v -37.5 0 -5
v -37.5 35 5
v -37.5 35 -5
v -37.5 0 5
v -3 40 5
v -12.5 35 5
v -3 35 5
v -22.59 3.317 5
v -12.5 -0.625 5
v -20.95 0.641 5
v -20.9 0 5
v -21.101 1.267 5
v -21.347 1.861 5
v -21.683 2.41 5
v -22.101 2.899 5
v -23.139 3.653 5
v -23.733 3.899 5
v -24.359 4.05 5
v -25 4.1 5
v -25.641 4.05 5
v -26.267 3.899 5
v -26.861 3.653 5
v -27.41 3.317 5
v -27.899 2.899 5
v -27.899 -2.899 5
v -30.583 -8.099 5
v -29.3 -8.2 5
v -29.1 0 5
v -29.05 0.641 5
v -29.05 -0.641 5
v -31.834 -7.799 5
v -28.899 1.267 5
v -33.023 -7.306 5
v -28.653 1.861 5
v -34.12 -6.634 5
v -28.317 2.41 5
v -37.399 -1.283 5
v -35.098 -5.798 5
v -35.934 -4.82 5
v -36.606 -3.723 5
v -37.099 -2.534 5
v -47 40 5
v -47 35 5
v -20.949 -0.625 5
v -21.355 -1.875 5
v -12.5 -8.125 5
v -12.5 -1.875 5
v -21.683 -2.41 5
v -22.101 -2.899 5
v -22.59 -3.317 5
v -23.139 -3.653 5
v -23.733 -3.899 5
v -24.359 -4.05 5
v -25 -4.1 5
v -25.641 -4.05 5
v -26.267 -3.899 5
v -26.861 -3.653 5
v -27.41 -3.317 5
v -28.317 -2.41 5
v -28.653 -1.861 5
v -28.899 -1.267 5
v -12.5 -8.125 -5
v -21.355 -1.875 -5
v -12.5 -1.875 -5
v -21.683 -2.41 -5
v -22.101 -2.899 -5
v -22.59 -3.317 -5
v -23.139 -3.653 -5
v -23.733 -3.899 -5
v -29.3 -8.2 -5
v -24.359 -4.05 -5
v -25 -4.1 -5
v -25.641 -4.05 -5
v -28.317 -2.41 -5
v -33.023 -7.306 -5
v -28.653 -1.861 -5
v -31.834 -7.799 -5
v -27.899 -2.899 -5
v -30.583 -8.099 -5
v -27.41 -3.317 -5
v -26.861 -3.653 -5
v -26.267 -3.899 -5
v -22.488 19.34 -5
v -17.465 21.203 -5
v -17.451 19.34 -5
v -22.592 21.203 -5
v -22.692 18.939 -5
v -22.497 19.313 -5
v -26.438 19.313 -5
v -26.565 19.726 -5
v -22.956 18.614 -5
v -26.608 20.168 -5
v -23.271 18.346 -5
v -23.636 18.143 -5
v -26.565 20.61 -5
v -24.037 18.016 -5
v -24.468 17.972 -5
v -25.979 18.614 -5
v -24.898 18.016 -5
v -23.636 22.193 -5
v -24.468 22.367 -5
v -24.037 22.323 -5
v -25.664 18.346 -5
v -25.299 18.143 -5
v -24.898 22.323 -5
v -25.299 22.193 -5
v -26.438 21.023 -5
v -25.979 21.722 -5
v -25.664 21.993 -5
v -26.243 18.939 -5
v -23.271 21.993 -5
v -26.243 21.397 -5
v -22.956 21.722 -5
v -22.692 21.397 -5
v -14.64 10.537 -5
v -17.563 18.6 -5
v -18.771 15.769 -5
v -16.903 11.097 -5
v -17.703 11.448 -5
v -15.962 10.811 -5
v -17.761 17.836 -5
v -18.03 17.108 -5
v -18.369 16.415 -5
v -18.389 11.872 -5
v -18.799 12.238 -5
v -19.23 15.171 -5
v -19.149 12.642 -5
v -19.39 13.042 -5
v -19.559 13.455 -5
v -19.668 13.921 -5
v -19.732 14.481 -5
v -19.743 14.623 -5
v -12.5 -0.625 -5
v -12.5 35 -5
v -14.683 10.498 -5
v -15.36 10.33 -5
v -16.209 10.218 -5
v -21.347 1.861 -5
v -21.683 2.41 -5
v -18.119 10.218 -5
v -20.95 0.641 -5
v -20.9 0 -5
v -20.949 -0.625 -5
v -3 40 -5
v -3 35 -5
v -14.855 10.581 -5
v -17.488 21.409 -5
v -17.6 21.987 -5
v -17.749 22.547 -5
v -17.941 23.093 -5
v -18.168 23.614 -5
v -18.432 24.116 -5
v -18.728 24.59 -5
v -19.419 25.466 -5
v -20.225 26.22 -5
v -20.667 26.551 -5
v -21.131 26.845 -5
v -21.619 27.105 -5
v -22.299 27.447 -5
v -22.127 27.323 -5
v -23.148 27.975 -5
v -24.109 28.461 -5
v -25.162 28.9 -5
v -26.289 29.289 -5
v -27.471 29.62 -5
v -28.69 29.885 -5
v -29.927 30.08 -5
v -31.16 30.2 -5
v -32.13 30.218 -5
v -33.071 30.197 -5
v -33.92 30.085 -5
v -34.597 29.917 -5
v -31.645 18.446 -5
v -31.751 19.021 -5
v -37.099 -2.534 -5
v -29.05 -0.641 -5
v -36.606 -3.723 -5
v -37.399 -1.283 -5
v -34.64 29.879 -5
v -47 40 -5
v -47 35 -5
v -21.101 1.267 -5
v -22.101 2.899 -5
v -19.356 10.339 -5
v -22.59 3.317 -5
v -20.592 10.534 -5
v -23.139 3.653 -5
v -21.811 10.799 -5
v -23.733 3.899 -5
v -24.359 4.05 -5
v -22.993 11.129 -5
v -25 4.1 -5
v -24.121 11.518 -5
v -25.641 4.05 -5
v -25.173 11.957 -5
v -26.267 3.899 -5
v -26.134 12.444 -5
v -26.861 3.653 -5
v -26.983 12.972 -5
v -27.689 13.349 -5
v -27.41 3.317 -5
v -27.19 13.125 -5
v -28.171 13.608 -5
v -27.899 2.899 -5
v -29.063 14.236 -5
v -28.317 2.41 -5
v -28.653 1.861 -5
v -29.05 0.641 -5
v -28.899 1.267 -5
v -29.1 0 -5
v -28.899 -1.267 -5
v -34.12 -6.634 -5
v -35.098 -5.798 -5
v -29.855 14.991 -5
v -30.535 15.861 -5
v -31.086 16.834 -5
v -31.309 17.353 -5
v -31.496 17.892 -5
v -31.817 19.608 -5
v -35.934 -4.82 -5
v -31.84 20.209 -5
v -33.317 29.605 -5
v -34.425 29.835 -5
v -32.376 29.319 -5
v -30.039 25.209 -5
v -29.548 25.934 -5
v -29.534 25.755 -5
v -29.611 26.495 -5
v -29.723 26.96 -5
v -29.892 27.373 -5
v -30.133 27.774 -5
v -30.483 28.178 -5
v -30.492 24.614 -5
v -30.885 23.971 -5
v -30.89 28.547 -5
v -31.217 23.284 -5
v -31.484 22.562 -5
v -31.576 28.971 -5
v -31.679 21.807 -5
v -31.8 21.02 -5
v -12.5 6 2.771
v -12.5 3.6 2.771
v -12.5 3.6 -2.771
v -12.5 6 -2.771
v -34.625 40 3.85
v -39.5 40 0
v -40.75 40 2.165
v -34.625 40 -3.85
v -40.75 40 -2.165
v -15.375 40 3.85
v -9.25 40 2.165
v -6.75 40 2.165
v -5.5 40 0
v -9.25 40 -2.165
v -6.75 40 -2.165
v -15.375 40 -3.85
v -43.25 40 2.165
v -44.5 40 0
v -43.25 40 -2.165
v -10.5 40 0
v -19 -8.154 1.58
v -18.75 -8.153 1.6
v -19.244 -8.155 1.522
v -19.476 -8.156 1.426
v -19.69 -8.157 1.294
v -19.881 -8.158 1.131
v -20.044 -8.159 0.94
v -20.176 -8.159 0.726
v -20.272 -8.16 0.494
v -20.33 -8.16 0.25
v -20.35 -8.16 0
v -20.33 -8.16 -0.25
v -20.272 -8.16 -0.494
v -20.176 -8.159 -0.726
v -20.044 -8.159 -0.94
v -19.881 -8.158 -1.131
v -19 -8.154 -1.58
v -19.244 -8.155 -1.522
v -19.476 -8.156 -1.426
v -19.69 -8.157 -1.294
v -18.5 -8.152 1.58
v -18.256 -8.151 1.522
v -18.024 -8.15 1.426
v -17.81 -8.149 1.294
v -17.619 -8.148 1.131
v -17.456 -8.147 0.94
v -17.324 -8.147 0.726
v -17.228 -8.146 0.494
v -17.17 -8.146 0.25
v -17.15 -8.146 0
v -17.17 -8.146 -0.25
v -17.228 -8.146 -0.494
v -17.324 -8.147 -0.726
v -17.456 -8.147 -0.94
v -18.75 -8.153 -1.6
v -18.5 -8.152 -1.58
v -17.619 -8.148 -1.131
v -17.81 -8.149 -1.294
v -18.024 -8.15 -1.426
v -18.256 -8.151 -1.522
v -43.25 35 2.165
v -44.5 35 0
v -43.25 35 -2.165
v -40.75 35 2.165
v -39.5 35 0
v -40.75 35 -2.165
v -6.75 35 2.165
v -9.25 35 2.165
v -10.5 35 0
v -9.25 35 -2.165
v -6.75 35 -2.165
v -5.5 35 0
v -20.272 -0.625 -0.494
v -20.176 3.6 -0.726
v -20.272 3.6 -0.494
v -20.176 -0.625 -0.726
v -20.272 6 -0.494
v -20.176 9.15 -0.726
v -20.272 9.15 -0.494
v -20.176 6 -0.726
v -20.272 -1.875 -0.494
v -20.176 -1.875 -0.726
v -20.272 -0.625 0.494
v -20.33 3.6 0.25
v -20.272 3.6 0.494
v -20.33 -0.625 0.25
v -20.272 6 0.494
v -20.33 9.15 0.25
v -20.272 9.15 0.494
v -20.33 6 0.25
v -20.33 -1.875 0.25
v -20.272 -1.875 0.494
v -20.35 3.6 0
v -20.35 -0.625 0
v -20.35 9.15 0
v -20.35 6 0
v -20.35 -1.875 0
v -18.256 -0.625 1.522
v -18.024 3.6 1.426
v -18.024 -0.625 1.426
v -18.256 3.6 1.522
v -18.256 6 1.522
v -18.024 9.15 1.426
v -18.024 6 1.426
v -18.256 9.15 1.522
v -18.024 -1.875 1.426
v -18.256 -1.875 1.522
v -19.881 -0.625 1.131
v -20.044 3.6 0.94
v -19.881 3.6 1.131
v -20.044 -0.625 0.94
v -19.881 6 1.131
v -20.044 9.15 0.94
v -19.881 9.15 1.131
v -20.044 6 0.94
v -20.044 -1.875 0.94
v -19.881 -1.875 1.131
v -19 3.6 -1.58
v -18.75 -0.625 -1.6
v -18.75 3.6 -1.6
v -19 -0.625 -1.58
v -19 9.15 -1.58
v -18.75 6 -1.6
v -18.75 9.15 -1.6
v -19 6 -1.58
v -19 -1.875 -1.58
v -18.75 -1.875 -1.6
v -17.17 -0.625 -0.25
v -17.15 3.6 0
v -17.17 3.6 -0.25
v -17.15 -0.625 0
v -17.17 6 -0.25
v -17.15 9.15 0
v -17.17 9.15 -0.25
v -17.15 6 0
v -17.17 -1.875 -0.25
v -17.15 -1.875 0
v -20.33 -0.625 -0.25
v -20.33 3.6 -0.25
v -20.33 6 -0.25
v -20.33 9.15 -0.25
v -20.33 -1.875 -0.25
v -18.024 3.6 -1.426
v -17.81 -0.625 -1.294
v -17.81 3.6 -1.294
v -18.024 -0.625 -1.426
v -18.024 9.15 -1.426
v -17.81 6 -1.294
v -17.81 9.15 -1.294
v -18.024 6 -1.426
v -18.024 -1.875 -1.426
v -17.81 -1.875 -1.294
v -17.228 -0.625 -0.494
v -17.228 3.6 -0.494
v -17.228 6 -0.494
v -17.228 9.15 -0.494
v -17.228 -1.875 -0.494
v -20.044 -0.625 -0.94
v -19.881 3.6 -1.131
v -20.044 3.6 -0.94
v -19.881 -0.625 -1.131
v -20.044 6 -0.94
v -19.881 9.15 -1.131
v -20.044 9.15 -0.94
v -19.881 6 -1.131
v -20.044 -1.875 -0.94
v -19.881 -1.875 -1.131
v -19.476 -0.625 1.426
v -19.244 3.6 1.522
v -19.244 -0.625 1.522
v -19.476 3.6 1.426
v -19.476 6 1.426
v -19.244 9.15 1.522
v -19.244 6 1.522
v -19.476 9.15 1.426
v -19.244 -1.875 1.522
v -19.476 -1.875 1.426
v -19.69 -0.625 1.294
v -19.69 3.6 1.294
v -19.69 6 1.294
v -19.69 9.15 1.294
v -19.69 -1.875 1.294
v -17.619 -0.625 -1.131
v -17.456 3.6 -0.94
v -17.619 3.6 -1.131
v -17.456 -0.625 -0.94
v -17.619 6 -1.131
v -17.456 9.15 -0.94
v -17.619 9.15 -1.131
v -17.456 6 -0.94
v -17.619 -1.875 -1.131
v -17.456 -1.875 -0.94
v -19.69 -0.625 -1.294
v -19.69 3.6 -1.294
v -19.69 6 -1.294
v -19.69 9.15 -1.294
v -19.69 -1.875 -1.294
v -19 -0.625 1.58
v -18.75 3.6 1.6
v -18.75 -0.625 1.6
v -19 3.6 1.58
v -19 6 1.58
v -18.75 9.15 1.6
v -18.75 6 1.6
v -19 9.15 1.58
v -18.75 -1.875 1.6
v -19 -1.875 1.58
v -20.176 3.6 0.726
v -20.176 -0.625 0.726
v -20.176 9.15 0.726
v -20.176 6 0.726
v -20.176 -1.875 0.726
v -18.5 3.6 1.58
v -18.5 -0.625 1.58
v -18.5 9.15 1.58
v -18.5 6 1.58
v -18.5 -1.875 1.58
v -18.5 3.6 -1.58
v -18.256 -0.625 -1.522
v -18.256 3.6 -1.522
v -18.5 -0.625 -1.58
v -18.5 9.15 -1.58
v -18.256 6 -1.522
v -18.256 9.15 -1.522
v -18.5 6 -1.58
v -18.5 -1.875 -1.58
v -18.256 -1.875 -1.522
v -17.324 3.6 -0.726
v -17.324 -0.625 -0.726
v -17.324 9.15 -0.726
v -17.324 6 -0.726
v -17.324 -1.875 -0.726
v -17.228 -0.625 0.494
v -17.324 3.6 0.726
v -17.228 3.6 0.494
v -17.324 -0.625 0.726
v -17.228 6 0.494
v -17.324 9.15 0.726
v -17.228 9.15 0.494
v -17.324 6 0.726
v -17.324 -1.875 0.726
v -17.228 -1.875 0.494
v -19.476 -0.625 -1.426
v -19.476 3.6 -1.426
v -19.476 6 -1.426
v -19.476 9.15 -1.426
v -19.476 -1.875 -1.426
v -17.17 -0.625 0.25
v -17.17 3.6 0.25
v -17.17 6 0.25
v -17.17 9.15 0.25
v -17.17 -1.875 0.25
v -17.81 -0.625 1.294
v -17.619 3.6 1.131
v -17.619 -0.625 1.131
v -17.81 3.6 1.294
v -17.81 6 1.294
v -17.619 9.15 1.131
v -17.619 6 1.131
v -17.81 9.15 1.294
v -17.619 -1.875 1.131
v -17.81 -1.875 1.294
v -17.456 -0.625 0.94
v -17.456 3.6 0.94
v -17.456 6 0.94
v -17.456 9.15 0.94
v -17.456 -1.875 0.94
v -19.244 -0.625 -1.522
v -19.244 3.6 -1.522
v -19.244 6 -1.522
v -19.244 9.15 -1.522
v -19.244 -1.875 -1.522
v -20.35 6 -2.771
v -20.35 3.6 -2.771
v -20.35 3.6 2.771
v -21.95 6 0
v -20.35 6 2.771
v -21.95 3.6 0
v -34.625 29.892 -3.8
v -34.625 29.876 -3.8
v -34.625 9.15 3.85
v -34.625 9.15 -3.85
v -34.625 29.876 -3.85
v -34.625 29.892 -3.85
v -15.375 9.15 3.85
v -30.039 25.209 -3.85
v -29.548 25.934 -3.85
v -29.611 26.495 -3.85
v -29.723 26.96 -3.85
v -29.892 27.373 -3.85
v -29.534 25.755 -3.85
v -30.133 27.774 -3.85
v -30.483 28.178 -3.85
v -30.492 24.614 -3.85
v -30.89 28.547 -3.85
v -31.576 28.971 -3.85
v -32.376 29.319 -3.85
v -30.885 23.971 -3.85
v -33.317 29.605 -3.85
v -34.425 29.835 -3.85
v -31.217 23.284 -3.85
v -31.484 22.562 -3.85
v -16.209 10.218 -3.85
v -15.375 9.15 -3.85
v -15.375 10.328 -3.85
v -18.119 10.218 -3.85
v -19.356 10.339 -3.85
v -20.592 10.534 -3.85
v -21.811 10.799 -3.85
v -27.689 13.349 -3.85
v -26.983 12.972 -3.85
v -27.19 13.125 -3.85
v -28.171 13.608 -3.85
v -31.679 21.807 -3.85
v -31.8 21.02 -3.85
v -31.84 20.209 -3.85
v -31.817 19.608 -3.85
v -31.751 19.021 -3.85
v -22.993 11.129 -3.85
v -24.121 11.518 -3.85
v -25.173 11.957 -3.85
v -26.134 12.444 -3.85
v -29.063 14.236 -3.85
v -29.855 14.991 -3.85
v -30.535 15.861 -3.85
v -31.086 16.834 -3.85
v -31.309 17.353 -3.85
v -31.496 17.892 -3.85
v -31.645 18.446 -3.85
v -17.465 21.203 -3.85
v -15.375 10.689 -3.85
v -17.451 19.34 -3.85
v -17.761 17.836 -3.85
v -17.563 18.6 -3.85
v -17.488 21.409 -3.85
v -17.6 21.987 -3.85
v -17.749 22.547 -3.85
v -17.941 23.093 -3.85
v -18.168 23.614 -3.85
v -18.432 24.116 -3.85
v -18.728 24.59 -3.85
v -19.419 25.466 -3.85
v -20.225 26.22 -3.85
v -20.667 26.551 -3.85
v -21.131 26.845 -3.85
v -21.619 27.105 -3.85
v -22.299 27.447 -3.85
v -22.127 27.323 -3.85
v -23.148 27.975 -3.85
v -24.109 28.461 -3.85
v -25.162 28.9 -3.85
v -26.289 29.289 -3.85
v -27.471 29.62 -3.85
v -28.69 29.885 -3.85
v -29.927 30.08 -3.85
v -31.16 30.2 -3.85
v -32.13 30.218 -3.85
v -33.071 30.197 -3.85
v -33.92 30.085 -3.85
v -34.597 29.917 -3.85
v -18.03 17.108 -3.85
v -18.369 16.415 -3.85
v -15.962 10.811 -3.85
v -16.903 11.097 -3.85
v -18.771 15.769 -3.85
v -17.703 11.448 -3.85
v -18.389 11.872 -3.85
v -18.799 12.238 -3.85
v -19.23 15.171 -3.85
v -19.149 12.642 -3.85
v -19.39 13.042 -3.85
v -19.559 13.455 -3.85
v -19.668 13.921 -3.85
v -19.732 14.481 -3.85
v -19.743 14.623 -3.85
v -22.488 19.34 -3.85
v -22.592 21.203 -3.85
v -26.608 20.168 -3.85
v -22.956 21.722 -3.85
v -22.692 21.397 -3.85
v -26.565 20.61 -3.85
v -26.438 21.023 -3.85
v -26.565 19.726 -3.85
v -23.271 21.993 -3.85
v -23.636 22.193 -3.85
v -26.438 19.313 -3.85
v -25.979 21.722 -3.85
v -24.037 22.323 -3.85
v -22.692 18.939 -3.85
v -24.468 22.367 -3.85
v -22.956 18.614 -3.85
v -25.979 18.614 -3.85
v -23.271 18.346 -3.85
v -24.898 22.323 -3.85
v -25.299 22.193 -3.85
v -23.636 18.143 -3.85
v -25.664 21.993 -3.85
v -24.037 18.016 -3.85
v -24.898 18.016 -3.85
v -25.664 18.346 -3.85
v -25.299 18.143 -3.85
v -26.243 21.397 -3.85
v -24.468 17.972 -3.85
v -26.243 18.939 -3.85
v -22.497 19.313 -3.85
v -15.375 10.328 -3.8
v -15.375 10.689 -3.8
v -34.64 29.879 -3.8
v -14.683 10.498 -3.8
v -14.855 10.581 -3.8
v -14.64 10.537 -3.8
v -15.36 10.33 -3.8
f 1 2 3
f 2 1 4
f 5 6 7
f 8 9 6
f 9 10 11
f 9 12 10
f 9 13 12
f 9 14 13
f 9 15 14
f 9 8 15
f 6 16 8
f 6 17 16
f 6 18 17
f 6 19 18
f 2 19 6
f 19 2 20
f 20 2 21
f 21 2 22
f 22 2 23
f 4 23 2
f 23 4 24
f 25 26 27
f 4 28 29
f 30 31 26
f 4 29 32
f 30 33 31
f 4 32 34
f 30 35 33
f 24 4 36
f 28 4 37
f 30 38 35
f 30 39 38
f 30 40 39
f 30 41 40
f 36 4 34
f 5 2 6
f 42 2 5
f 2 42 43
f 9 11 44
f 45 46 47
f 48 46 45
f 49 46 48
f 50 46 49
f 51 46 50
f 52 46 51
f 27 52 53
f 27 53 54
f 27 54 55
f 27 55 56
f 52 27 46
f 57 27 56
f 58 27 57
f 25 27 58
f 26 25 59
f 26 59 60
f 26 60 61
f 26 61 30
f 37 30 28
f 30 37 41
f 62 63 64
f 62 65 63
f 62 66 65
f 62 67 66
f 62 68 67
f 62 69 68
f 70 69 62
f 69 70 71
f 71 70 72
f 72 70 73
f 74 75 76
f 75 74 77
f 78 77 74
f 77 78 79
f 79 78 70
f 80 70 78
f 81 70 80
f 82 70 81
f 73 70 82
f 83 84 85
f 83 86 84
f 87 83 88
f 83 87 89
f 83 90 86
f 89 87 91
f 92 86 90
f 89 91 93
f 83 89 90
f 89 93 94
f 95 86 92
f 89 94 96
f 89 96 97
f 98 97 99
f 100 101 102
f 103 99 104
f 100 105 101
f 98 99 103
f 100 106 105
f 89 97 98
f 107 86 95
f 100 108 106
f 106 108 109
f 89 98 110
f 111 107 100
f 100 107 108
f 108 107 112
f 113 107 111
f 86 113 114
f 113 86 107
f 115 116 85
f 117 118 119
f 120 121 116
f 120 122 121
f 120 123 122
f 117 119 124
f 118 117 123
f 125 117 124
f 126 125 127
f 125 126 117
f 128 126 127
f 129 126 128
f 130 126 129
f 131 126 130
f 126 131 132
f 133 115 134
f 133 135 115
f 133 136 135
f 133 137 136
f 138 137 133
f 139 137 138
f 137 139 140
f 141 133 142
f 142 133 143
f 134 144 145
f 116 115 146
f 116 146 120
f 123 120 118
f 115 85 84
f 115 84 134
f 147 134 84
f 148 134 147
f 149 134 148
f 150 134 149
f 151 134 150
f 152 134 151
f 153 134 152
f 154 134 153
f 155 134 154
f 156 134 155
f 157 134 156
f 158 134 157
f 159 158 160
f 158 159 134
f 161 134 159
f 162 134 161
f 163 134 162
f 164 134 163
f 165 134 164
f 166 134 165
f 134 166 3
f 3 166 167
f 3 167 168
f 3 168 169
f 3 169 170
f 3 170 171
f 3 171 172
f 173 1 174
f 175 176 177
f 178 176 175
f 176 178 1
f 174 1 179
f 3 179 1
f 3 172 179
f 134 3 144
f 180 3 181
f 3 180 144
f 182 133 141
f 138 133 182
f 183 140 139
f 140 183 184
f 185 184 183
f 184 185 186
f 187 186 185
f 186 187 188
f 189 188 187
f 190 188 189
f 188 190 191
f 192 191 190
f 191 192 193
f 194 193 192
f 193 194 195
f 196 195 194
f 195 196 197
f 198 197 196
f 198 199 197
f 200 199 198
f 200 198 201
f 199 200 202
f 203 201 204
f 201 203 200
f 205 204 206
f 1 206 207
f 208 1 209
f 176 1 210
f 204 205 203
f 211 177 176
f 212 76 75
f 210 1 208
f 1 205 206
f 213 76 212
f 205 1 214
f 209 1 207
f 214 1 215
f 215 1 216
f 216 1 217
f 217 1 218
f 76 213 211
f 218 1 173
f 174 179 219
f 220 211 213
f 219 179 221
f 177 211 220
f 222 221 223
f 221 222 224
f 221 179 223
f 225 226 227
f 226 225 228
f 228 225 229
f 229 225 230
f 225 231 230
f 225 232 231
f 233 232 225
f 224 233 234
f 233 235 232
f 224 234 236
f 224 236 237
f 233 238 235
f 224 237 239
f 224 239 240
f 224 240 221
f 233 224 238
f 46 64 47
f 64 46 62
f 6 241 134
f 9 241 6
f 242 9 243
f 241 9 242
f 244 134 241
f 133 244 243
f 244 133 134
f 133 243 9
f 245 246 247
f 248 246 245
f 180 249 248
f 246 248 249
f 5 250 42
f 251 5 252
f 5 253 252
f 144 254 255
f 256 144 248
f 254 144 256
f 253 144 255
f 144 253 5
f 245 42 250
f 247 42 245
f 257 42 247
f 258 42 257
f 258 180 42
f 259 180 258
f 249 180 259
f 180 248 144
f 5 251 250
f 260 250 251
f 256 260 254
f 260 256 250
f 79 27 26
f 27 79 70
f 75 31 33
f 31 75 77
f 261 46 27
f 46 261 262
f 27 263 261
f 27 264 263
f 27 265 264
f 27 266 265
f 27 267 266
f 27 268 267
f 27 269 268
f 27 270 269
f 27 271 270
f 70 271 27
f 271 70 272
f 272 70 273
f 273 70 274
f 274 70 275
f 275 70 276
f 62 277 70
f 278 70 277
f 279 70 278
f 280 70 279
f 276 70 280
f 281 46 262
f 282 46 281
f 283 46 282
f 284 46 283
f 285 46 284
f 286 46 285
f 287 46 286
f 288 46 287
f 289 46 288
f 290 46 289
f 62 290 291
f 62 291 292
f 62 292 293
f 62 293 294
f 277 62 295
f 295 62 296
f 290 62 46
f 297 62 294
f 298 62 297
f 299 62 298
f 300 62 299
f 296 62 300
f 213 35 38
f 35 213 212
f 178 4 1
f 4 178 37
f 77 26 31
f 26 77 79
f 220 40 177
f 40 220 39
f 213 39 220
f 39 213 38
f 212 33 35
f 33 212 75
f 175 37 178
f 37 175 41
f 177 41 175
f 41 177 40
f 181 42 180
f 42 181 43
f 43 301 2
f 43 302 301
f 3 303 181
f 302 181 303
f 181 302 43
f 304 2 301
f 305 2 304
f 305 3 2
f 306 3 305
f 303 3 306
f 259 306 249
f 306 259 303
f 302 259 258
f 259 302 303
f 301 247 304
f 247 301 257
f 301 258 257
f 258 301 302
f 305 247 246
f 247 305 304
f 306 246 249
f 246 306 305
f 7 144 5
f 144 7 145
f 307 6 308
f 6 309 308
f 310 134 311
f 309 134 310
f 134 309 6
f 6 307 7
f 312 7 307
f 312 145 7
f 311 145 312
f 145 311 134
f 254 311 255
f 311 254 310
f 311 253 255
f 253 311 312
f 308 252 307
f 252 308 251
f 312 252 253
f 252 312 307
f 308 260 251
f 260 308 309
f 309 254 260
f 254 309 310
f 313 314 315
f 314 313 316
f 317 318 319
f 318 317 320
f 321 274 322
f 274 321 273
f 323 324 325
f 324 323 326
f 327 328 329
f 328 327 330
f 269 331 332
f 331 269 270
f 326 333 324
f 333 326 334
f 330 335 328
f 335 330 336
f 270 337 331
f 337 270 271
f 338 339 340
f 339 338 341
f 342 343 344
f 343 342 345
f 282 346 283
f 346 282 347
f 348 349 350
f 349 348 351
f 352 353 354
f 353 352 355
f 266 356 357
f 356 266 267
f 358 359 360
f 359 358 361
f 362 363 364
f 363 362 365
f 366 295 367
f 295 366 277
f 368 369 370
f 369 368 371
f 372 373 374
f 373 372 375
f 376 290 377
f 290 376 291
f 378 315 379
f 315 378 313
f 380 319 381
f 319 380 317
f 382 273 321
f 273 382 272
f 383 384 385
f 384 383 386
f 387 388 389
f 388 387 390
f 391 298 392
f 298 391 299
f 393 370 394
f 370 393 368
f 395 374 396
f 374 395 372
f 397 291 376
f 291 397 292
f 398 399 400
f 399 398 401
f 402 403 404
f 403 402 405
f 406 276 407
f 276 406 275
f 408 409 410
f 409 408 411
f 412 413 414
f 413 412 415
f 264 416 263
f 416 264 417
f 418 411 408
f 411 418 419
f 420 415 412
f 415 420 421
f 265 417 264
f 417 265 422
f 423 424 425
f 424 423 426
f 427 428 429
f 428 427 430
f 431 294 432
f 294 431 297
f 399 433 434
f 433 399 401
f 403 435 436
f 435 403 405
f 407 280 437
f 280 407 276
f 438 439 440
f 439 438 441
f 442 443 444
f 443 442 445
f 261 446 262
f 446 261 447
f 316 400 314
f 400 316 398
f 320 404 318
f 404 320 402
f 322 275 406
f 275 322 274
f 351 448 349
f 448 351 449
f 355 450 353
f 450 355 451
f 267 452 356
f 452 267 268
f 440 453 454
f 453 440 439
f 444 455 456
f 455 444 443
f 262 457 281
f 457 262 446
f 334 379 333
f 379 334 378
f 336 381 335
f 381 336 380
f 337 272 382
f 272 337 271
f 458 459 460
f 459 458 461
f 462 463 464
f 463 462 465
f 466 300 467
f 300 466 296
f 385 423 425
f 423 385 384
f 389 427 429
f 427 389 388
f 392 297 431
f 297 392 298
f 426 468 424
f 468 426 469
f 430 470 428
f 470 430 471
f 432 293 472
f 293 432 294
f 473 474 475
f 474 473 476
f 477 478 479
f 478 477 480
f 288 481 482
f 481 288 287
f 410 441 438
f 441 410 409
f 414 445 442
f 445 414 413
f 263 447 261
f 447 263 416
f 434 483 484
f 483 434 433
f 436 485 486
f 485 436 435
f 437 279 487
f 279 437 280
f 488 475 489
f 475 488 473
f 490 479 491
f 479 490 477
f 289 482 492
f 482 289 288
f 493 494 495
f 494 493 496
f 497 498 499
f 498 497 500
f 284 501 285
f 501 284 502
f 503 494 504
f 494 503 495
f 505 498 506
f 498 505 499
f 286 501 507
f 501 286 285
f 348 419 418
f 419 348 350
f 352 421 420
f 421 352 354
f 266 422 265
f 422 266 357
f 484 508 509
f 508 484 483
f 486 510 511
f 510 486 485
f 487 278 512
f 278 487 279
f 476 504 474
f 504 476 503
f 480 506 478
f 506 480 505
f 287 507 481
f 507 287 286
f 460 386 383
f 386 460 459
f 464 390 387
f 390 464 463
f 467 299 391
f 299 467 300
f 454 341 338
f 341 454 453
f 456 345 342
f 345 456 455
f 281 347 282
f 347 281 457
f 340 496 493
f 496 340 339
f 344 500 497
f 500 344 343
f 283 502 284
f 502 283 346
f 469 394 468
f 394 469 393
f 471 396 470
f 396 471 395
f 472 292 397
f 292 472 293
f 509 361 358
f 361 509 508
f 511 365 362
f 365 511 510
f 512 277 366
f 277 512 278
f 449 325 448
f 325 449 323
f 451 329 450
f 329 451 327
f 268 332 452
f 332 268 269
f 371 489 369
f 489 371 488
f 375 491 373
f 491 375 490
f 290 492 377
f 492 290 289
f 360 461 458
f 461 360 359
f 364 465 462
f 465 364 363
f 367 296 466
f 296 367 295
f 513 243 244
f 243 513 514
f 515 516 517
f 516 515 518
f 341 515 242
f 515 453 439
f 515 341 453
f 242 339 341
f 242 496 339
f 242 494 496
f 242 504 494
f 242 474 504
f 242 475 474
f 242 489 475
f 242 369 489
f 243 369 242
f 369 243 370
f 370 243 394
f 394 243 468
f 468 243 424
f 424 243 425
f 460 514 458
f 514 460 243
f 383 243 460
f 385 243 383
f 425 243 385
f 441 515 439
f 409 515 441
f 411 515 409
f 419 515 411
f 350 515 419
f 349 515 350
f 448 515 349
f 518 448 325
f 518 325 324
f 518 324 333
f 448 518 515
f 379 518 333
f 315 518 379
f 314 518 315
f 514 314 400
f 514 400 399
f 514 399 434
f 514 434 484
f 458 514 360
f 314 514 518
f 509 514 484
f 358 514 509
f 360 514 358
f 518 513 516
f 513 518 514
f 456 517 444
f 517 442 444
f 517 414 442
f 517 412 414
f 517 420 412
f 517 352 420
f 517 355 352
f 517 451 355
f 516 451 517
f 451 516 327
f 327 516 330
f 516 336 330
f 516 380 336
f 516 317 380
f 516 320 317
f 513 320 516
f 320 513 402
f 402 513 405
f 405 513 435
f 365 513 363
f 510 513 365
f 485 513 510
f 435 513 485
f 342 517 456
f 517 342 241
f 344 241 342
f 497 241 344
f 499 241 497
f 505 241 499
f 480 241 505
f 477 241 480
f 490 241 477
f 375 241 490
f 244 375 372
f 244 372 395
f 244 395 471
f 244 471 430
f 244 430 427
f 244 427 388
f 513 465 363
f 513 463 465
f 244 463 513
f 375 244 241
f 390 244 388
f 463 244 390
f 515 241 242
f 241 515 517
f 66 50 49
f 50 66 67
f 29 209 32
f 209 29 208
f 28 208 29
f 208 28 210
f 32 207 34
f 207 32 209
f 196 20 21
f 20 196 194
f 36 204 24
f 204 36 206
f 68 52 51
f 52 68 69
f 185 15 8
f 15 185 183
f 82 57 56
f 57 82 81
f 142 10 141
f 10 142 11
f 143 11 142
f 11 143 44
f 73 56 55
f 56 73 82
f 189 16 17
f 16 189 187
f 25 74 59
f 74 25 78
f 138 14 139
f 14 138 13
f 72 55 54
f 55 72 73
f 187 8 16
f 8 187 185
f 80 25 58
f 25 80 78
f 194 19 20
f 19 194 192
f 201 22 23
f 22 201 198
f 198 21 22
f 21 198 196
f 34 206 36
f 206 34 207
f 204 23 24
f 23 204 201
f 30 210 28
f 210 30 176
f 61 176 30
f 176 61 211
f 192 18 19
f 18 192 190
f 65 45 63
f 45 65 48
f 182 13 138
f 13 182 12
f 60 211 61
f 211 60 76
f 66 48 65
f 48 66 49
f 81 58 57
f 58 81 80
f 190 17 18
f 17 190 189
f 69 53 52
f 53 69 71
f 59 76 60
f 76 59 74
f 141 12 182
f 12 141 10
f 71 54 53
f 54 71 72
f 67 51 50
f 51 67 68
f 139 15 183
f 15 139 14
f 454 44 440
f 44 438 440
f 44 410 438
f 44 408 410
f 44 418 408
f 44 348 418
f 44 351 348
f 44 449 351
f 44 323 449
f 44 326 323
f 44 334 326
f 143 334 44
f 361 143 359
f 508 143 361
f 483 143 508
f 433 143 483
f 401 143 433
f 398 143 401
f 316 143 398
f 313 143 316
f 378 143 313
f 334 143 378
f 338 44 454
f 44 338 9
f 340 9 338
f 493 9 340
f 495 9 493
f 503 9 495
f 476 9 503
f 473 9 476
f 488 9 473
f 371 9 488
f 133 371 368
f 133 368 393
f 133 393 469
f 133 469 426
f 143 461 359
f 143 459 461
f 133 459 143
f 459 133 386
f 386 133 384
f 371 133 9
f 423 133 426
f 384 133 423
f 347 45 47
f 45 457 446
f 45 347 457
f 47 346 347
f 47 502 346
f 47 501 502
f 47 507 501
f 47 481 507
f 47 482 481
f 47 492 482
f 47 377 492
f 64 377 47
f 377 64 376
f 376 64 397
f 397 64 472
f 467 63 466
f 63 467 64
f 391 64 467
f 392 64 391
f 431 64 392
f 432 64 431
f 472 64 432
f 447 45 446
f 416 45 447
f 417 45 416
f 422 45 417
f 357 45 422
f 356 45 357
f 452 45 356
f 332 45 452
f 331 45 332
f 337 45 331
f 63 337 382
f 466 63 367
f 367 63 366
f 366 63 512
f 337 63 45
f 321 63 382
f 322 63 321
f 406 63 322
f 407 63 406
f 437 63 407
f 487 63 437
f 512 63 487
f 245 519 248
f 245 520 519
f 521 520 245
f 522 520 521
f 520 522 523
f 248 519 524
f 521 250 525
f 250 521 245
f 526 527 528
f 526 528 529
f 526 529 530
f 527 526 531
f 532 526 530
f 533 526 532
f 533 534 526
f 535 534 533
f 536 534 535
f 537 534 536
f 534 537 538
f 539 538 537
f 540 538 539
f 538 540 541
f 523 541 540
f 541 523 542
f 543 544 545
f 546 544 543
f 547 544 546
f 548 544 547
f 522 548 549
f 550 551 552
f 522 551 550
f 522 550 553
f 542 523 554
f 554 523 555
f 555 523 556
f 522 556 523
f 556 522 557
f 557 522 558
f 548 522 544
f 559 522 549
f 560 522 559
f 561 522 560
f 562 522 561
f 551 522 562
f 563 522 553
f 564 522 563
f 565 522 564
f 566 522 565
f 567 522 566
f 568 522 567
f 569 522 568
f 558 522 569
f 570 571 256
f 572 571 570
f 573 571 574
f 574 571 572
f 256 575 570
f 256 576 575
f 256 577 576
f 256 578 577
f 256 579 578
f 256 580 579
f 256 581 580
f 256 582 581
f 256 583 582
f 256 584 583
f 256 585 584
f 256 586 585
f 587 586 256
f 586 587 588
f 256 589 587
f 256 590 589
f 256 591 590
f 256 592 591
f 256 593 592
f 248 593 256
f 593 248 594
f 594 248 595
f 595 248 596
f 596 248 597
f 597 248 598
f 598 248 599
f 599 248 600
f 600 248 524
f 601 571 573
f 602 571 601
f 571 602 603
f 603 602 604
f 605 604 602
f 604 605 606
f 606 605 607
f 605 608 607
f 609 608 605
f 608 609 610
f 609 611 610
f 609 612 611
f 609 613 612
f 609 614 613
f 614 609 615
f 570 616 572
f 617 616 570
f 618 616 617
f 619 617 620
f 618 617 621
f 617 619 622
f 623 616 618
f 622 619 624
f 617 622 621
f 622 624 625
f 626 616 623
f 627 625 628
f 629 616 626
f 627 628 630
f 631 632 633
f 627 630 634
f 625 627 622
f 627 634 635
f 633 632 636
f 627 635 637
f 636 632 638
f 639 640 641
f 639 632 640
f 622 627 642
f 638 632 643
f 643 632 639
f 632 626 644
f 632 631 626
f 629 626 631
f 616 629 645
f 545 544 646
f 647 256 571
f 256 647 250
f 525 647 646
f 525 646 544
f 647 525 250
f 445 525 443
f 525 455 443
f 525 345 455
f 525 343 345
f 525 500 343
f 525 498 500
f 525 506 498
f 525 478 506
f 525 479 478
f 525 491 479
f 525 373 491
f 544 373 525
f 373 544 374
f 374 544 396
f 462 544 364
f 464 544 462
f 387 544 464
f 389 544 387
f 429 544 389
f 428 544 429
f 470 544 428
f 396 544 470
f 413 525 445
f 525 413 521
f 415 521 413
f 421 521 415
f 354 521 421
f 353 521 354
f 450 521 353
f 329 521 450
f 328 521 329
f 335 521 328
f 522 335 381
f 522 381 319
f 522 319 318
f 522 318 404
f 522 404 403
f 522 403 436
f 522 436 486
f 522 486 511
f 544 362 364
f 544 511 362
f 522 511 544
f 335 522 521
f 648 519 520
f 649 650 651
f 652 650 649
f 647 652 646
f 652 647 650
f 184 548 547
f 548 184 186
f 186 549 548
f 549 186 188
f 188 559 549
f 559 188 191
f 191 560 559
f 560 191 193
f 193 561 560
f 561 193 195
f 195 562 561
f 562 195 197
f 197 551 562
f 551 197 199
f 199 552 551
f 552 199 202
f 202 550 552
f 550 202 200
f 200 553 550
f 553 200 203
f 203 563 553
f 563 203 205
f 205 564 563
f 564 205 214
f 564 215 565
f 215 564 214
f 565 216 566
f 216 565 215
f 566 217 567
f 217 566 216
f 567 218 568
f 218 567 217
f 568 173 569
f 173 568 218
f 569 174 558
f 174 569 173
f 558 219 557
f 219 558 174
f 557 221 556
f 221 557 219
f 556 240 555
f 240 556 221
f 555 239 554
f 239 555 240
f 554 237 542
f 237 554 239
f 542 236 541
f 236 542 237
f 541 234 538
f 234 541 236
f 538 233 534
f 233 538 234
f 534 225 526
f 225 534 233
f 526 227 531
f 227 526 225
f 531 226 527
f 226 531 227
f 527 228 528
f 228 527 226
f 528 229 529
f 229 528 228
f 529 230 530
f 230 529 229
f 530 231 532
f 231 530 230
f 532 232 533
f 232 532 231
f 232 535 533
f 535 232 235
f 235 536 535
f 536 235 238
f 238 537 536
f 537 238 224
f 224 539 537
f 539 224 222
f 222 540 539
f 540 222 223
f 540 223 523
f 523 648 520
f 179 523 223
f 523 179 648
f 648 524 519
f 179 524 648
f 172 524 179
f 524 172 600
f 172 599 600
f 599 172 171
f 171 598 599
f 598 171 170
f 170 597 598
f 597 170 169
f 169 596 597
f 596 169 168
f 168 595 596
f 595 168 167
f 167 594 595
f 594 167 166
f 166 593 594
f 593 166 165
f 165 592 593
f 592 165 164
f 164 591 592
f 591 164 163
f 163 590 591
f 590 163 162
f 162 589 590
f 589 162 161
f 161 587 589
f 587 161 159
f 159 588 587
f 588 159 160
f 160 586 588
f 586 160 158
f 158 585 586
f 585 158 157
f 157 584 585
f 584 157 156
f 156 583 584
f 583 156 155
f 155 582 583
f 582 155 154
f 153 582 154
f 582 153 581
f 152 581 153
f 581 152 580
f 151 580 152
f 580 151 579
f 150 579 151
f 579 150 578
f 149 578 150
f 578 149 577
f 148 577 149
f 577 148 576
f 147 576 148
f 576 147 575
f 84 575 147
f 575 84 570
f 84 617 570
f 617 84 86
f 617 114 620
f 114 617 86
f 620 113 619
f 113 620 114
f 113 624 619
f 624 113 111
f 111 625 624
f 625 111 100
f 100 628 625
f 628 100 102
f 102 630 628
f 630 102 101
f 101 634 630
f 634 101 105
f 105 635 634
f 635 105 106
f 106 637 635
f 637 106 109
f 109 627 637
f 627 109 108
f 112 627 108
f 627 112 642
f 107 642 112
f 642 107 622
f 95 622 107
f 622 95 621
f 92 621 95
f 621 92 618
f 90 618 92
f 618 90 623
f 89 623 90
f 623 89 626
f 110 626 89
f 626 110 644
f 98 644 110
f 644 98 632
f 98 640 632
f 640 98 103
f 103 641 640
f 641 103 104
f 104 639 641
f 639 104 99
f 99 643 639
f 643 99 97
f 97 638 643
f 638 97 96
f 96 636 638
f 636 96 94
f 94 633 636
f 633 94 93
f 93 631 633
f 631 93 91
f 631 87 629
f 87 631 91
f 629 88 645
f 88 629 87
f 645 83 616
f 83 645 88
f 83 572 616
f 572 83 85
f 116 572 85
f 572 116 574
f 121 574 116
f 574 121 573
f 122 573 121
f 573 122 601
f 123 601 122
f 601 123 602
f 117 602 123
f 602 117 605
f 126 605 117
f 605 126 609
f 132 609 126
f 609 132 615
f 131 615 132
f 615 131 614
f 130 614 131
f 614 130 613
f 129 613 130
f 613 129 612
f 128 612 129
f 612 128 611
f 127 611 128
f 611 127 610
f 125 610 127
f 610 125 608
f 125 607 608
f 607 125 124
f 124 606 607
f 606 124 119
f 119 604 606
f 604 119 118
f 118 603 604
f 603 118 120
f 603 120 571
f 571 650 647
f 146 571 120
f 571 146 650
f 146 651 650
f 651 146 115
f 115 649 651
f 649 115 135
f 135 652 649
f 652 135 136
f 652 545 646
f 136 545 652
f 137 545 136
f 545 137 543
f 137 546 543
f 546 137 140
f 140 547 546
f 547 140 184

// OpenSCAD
// file: ../libs/utils/build_plate.scad
// Minimal build plate helper for browser customizer builds.
module build_plate(build_plate_selector=0, build_plate_manual_x=100, build_plate_manual_y=100) {
  // intentionally no-op in browser preview
}
// file: ../libs/MCAD/nuts_and_bolts.scad
// License: GPL 2.0

//testNutsAndBolts();

module testNutsAndBolts()
{
	$fn = 360;
	translate([0,15])nutHole(3, proj=2);
	boltHole(3, length= 30, proj=2);
}

MM = "mm";
INCH = "inch"; //Not yet supported

//Based on: http://www.roymech.co.uk/Useful_Tables/Screws/Hex_Screws.htm
METRIC_NUT_AC_WIDTHS = 
[
	-1, //0 index is not used but reduces computation
	-1,
	-1,
	6.40,//m3
	8.10,//m4
	9.20,//m5
	11.50,//m6
	-1,
	15.00,//m8
	-1,
	19.60,//m10
	-1,
	22.10,//m12
	-1,
	-1,
	-1,
	27.70,//m16
	-1,
	-1,
	-1,
	34.60,//m20
	-1,
	-1,
	-1,
	41.60,//m24
	-1,
	-1,
	-1,
	-1,
	-1,
	53.1,//m30
	-1,
	-1,
	-1,
	-1,
	-1,
	63.5//m36
];
METRIC_NUT_THICKNESS =
[
	-1, //0 index is not used but reduces computation
	-1,
	-1,
	2.40,//m3
	3.20,//m4
	4.00,//m5
	5.00,//m6
	-1,
	6.50,//m8
	-1,
	8.00,//m10
	-1,
	10.00,//m12
	-1,
	-1,
	-1,
	13.00,//m16
	-1,
	-1,
	-1,
	16.00//m20
	-1,
	-1,
	-1,
	19.00,//m24
	-1,
	-1,
	-1,
	-1,
	-1,
	24.00,//m30
	-1,
	-1,
	-1,
	-1,
	-1,
	29.00//m36
];

COURSE_METRIC_BOLT_MAJOR_THREAD_DIAMETERS = 
[//based on max values
	-1, //0 index is not used but reduces computation
	-1,
	-1,
	2.98,//m3
	3.978,//m4
	4.976,//m5
	5.974,//m6
	-1,
	7.972,//m8
	-1,
	9.968,//m10
	-1,
	11.966,//m12
	-1,
	-1,
	-1,
	15.962,//m16
	-1,
	-1,
	-1,
	19.958,//m20
	-1,
	-1,
	-1,
	23.952,//m24
	-1,
	-1,
	-1,
	-1,
	-1,
	29.947,//m30
	-1,
	-1,
	-1,
	-1,
	-1,
	35.940//m36
];

module nutHole(size, units=MM, tolerance = +0.0001, proj = -1)
{
	//takes a metric screw/nut size and looksup nut dimensions
	radius = METRIC_NUT_AC_WIDTHS[size]/2+tolerance;
	height = METRIC_NUT_THICKNESS[size]+tolerance;
	if (proj == -1)
	{
		cylinder(r= radius, h=height, $fn = 6, center=[0,0]);
	}
	if (proj == 1)
	{
		circle(r= radius, $fn = 6);
	}
	if (proj == 2)
	{
		translate([-radius/2, 0])
			square([radius*2, height]);
	}
}

module boltHole(size, units=MM, length, tolerance = +0.0001, proj = -1)
{
	radius = COURSE_METRIC_BOLT_MAJOR_THREAD_DIAMETERS[size]/2+tolerance;
//TODO: proper screw cap values
	capHeight = METRIC_NUT_THICKNESS[size]+tolerance; //METRIC_BOLT_CAP_HEIGHTS[size]+tolerance;
	capRadius = METRIC_NUT_AC_WIDTHS[size]/2+tolerance; //METRIC_BOLT_CAP_RADIUS[size]+tolerance;
	
	if (proj == -1)
	{
	translate([0, 0, -capHeight])
		cylinder(r= capRadius, h=capHeight);
	cylinder(r = radius, h = length);
	}
	if (proj == 1)
	{
		circle(r = radius);
	}
	if (proj == 2)
	{
		translate([-capRadius/2, -capHeight])
			square([capRadius*2, capHeight]);
		square([radius*2, length]);
	}
}
boltHole(3);
// file: ../libs/build_plate.scad
//use this to include a build plate visualization in your openSCAD scripts. Very useful for things designed to be edited in Makerbot Customizer

//to use, either include or use <utils/build_plate.scad>

//then just call build_plate(); with the following arguments (also, you have to have a real object in your scene for this to render)

//putting 0 as the first argument will give you a Replicator 2 build plate
//putting 1 as the first argument will give you a Replicator 1 build plate
//putting 2 as the first argument will give you a Thingomatic build plate
//putting 3 as the first argument will give you a manually adjustable build plate (note: if you use this option, you need to specify your build plates X length (in mm) as the second argument and the Y length (in mm) as the third argument. eg. build_plate(3,150,120);)

/*

to give your user control of which build plate they see in Customizer, include the following code:

use <utils/build_plate.scad>

//for display only, doesn't contribute to final object
build_plate_selector = 0; //[0:Replicator 2,1: Replicator,2:Thingomatic,3:Manual]
//when Build Plate Selector is set to "manual" this controls the build plate x dimension
build_plate_manual_x = 100; //[100:400]
//when Build Plate Selector is set to "manual" this controls the build plate y dimension
build_plate_manual_y = 100; //[100:400]

build_plate(build_plate_selector,build_plate_manual_x,build_plate_manual_y);

*/




//to see how this works, uncomment the following code

//build_plate_selector = 0; //[0:Replicator 2,1: Replicator,2:Thingomatic,3:Manual]
//build_plate_manual_x = 100; //[100:400]
//build_plate_manual_y = 100; //[100:400]
//
//build_plate(build_plate_selector,build_plate_manual_x,build_plate_manual_y);
//
//cube(5);


module build_plate(bp,manX,manY){

		translate([0,0,-.52]){
			if(bp == 0){
				%cube([285,153,1],center = true);
			}
			if(bp == 1){
				%cube([225,145,1],center = true);
			}
			if(bp == 2){
				%cube([120,120,1],center = true);
			}
			if(bp == 3){
				%cube([manX,manY,1],center = true);
			}
		
		}
		translate([0,0,-.5]){
			if(bp == 0){
				for(i = [-14:14]){
					translate([i*10,0,0])
					%cube([.5,153,1.01],center = true);
				}
				for(i = [-7:7]){
					translate([0,i*10,0])
					%cube([285,.5,1.01],center = true);
				}	
			}
			if(bp == 1){
				for(i = [-11:11]){
					translate([i*10,0,0])
						%cube([.5,145,1.01],center = true);
				}
				for(i = [-7:7]){
					translate([0,i*10,0])
						%cube([225,.5,1.01],center = true);
				}
			}
			if(bp == 2){
				for(i = [-6:6]){
					translate([i*10,0,0])
						%cube([.5,120,1.01],center = true);
				}
				for(i = [-6:6]){
					translate([0,i*10,0])
						%cube([120,.5,1.01],center = true);
				}
			}
			if(bp == 3){
				for(i = [-(floor(manX/20)):floor(manX/20)]){
					translate([i*10,0,0])
						%cube([.5,manY,1.01],center = true);
				}
				for(i = [-(floor(manY/20)):floor(manY/20)]){
					translate([0,i*10,0])
						%cube([manX,.5,1.01],center = true);
				}
			}
		}
}
// main file
// //  Cyclone PCB Factory: a 3D printable CNC machine for PCB manufacture
// // Created by @yOPERO 
// // License: Attribution - Share Alike - Creative Commons (http://creativecommons.org/licenses/by-sa/3.0/)


use <../libs/build_plate.scad>
use <../libs/MCAD/nuts_and_bolts.scad>
fileNameLogo = "../libs/logo/cyclonelogoC.dxf";

M8_rod_diam = 8.2;
M3_rod_diam = 3.2;

smooth_rod_margin = 1;
Y_rod_height = 40;

base_screw_len = 7;
base_screw_diameter = 5;

frame_width = 25;
frame_height = Y_rod_height-smooth_rod_margin;
frame_depth = 10;

module mainBlock(){
  union(){
    //main block
    translate([0,Y_rod_height/2,0])
        cube([frame_width,Y_rod_height,frame_depth],center=true);
    //top of the block
    hull(){
      translate([frame_width/2 - M8_rod_diam,0,0])
        cylinder(r=M8_rod_diam,h=frame_depth,center = true, $fn=40);

      translate([-frame_width/4,-frame_width/8,0])
        cube([frame_width/2,frame_depth,frame_depth],center=true);
    }
  }
}

module M8rod(){
    cylinder(r=M8_rod_diam/2,h=50,center=true,$fn=40);
}

module gap(){
    translate([-frame_width/4,-frame_depth/8,0])
        cube([frame_width/2,frame_depth/8,frame_depth],center=true);
}

module hole(){
    scale([0.77,1.5,0.77])
    //main block shirnked
        translate([0,Y_rod_height/2 +2+ M8_rod_diam/2,0])
          cube([frame_width,Y_rod_height,frame_depth],center=true);
}

module M3rodAndNut(){
    //M3 screw hole
    translate([-frame_width/4,0,0])
      rotate([90,0,0])        
        cylinder(r=M3_rod_diam/2,h=50,center=true,$fn=40);
    //M3 nut trap
    hull(){
    	translate([-frame_width/4,6,0])
        	rotate([90,0,0])
           		nutHole(3);
    	translate([-frame_width/2,6,0])
        	rotate([90,0,0])
           		nutHole(3); 
        }  	
}

module supportL(){
    mirror([0,0,0])
    translate([17,40 -10/4,0]){
        difference(){
          cube([10,5,10], center = true);
          rotate([90,0,0])
            cylinder(r=base_screw_diameter/2,h=2*base_screw_len,center=true,$fn=6);
      }
    }
}

module supportR(){
    mirror([1,0,0,])
      supportL();
}

module mainBody(){
  mainBlock();
  supportR();
  supportL();
}

module logo(mirror = 0){
	logoDepth =-1.2;
	if(mirror){		
		translate([-frame_width/2 + 1.5,Y_rod_height/4,-frame_depth/2])
			resize([20,20,1.2])
				linear_extrude(file = fileNameLogo, height=2);
	}else{
		mirror([1,0,0])
		translate([-frame_width/2 + 1.5,Y_rod_height/4,-frame_depth/2])
				resize([20,20,1.2])
					linear_extrude(file = fileNameLogo, height=2);
	}
}

module Y_rod_idler(side = 0, logo = 0){
	/*if left, side = 1
	  if right, side = 0*/
	mirror([side,0,0])
	difference(){
	    mainBody();
	    M8rod();
	    M3rodAndNut();
	    gap();
	    hole(); 
      if(logo)
        logo(side);	      
	}
}

module show_printbed(){
	translate([frame_width/2,frame_height/2,-frame_depth/2]) build_plate(3,150,140);
}

module Y_rod_idler_leftX(logo){
	translate([-25,0,0])	
		Y_rod_idler(1, logo);
}

module Y_rod_idler_rightX(logo){
	translate([25,0,0])	
		Y_rod_idler(0, logo);
}

/***************************************************************/
//Y_rod_idler_rightX(logo = 1);
Y_rod_idler_leftX(logo = 1);
// Y_rod_idler_right(); // Without logo
// Y_rod_idler_right(); // Without logo
//show_printbed();
